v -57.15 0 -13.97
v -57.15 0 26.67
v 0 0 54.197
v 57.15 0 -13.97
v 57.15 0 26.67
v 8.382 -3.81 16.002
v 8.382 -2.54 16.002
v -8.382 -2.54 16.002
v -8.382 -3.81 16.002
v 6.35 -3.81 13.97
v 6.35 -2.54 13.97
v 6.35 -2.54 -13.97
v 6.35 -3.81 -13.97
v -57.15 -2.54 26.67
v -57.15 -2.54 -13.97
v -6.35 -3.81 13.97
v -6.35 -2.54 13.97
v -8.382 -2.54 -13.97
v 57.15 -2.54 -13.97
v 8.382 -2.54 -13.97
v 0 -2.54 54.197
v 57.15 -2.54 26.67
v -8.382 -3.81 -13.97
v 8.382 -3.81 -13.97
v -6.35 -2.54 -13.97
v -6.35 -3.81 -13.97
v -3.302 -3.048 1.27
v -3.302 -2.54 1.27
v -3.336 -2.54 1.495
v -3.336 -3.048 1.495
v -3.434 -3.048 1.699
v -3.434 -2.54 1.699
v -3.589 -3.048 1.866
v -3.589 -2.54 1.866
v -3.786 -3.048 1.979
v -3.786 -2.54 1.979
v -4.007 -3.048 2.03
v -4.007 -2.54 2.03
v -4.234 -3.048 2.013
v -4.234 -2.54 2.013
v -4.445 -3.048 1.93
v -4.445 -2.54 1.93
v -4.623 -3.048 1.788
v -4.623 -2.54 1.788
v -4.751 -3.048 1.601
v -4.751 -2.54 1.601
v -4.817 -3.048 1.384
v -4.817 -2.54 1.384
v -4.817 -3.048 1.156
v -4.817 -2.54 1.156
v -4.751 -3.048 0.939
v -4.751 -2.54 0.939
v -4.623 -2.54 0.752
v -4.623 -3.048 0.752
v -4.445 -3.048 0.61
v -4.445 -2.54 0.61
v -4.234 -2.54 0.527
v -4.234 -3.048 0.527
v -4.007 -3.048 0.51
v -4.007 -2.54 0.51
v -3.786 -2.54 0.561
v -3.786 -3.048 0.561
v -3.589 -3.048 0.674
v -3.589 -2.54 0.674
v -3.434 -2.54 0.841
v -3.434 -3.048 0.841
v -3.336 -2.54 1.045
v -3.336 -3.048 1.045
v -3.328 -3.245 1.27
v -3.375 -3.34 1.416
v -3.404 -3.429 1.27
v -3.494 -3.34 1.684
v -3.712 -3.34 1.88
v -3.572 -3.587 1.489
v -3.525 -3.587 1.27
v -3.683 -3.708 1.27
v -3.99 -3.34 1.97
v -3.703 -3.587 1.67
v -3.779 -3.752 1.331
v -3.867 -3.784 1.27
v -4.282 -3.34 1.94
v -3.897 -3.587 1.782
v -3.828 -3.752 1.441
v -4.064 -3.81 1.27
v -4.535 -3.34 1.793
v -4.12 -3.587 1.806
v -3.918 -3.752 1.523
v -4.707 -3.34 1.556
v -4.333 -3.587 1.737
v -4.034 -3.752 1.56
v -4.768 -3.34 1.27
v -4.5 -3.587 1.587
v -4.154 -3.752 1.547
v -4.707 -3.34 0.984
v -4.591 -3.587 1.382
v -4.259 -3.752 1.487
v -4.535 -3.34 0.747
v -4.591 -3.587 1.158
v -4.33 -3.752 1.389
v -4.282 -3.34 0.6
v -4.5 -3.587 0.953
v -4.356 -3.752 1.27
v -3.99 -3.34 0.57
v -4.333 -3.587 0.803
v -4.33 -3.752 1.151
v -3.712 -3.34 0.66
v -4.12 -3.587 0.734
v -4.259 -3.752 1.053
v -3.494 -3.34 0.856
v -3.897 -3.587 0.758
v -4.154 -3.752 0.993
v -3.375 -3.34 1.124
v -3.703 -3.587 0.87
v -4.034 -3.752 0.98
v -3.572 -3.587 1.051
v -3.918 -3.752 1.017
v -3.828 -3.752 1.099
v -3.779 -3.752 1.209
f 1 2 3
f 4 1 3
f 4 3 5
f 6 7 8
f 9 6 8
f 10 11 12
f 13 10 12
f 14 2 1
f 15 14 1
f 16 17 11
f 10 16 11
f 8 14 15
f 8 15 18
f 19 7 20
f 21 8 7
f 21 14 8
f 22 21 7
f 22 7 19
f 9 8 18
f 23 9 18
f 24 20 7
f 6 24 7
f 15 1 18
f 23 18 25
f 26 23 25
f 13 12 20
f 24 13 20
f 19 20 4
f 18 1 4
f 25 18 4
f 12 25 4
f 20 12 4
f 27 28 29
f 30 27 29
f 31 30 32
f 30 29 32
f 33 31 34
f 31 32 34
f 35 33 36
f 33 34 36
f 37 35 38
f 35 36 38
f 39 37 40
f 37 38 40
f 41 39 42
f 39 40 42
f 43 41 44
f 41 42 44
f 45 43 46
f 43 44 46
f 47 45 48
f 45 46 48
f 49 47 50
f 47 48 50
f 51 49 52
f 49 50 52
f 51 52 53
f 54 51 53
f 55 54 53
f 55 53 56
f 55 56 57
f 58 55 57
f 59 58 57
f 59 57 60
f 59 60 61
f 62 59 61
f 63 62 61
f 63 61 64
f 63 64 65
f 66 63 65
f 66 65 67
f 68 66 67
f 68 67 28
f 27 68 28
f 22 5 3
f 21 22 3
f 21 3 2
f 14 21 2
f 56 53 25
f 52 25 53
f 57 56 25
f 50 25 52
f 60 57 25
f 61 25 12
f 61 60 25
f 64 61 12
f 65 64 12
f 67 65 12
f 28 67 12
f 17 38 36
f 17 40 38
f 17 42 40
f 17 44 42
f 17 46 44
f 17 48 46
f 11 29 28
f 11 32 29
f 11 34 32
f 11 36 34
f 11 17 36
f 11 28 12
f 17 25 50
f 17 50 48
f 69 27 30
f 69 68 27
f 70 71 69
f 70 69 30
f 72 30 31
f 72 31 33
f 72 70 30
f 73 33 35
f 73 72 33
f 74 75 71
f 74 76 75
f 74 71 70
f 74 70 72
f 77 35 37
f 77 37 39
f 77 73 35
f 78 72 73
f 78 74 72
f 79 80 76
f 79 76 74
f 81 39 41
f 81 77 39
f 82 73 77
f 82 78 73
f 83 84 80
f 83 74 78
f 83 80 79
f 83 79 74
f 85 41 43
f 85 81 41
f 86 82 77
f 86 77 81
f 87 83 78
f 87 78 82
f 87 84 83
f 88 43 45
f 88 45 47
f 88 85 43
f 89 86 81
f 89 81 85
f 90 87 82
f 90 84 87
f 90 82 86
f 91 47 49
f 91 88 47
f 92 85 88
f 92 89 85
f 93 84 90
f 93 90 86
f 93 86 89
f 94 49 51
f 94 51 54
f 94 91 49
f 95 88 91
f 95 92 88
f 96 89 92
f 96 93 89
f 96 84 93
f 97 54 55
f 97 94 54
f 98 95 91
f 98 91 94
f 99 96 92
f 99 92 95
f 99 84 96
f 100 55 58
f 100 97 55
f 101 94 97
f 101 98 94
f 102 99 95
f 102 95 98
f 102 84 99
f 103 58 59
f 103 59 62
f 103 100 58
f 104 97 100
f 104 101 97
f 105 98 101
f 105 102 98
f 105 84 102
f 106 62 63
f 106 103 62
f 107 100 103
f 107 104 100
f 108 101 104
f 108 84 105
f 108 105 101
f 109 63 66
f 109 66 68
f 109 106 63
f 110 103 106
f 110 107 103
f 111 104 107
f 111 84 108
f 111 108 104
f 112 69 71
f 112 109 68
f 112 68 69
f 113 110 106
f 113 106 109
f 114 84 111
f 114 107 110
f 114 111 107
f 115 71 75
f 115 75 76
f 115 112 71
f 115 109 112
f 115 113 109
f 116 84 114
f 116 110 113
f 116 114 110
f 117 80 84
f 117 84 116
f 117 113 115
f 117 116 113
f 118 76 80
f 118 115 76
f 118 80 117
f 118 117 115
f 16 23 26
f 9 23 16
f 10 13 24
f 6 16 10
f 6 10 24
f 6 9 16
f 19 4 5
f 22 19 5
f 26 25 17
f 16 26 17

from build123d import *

# Parameters (mm, degrees)
F1_DEPTH = 2.54
F0_W     = 12.7
F0_H     = 27.94
F0_R     = 0.762
F2_DEPTH = 3.81
F3_DEPTH = 3.81
F4_R     = 0.762


# Not quite as in the source:
# - a feature names something its author has since deleted; it is built from what else it names


with BuildPart() as f1:
    # F0 (on Front) → F1 (new body)
    with BuildSketch(Plane.XZ):
        Polygon((0, 54.1968159378), (-57.15, 26.67), (57.15, 26.67), align=None)
        Polygon((-57.15, -13.97), (-8.382, -13.97), (-8.382, 16.002), (8.382, 16.002), (8.382, -13.97), (57.15, -13.97), (57.15, 26.67), (-57.15, 26.67), align=None)
    extrude(amount=F1_DEPTH)



with BuildPart() as f1b:
    # F0 (on Front) → F1, piece 2 (new body)
    with BuildSketch(Plane.XZ):
        Rectangle(F0_W, F0_H)
        with Locations((-4.064, 1.27)):
            Circle(F0_R, mode=Mode.SUBTRACT)
    extrude(amount=F1_DEPTH)


with BuildPart() as f1_1:
    add(f1.part)

    add(f1b.part)  # F2 merges F1b
    # F0 (on Front) → F2 (join)
    with BuildSketch(Plane.XZ):
        Polygon((-6.35, -13.97), (-6.35, 13.97), (6.35, 13.97), (6.35, -13.97), (8.382, -13.97), (8.382, 16.002), (-8.382, 16.002), (-8.382, -13.97), align=None)
    extrude(amount=F2_DEPTH)

    # F0 (on Front) → F3 (join)
    with BuildSketch(Plane.XZ):
        with Locations((-4.064, 1.27)):
            Circle(F0_R)
    extrude(amount=F3_DEPTH)

    # F4
    f4_edges = [f1_1.edges().sort_by_distance(p)[0] for p in [
        (-4.826, -3.81, 1.27),
    ]]
    fillet(f4_edges, radius=F4_R)


solid = f1_1.part
